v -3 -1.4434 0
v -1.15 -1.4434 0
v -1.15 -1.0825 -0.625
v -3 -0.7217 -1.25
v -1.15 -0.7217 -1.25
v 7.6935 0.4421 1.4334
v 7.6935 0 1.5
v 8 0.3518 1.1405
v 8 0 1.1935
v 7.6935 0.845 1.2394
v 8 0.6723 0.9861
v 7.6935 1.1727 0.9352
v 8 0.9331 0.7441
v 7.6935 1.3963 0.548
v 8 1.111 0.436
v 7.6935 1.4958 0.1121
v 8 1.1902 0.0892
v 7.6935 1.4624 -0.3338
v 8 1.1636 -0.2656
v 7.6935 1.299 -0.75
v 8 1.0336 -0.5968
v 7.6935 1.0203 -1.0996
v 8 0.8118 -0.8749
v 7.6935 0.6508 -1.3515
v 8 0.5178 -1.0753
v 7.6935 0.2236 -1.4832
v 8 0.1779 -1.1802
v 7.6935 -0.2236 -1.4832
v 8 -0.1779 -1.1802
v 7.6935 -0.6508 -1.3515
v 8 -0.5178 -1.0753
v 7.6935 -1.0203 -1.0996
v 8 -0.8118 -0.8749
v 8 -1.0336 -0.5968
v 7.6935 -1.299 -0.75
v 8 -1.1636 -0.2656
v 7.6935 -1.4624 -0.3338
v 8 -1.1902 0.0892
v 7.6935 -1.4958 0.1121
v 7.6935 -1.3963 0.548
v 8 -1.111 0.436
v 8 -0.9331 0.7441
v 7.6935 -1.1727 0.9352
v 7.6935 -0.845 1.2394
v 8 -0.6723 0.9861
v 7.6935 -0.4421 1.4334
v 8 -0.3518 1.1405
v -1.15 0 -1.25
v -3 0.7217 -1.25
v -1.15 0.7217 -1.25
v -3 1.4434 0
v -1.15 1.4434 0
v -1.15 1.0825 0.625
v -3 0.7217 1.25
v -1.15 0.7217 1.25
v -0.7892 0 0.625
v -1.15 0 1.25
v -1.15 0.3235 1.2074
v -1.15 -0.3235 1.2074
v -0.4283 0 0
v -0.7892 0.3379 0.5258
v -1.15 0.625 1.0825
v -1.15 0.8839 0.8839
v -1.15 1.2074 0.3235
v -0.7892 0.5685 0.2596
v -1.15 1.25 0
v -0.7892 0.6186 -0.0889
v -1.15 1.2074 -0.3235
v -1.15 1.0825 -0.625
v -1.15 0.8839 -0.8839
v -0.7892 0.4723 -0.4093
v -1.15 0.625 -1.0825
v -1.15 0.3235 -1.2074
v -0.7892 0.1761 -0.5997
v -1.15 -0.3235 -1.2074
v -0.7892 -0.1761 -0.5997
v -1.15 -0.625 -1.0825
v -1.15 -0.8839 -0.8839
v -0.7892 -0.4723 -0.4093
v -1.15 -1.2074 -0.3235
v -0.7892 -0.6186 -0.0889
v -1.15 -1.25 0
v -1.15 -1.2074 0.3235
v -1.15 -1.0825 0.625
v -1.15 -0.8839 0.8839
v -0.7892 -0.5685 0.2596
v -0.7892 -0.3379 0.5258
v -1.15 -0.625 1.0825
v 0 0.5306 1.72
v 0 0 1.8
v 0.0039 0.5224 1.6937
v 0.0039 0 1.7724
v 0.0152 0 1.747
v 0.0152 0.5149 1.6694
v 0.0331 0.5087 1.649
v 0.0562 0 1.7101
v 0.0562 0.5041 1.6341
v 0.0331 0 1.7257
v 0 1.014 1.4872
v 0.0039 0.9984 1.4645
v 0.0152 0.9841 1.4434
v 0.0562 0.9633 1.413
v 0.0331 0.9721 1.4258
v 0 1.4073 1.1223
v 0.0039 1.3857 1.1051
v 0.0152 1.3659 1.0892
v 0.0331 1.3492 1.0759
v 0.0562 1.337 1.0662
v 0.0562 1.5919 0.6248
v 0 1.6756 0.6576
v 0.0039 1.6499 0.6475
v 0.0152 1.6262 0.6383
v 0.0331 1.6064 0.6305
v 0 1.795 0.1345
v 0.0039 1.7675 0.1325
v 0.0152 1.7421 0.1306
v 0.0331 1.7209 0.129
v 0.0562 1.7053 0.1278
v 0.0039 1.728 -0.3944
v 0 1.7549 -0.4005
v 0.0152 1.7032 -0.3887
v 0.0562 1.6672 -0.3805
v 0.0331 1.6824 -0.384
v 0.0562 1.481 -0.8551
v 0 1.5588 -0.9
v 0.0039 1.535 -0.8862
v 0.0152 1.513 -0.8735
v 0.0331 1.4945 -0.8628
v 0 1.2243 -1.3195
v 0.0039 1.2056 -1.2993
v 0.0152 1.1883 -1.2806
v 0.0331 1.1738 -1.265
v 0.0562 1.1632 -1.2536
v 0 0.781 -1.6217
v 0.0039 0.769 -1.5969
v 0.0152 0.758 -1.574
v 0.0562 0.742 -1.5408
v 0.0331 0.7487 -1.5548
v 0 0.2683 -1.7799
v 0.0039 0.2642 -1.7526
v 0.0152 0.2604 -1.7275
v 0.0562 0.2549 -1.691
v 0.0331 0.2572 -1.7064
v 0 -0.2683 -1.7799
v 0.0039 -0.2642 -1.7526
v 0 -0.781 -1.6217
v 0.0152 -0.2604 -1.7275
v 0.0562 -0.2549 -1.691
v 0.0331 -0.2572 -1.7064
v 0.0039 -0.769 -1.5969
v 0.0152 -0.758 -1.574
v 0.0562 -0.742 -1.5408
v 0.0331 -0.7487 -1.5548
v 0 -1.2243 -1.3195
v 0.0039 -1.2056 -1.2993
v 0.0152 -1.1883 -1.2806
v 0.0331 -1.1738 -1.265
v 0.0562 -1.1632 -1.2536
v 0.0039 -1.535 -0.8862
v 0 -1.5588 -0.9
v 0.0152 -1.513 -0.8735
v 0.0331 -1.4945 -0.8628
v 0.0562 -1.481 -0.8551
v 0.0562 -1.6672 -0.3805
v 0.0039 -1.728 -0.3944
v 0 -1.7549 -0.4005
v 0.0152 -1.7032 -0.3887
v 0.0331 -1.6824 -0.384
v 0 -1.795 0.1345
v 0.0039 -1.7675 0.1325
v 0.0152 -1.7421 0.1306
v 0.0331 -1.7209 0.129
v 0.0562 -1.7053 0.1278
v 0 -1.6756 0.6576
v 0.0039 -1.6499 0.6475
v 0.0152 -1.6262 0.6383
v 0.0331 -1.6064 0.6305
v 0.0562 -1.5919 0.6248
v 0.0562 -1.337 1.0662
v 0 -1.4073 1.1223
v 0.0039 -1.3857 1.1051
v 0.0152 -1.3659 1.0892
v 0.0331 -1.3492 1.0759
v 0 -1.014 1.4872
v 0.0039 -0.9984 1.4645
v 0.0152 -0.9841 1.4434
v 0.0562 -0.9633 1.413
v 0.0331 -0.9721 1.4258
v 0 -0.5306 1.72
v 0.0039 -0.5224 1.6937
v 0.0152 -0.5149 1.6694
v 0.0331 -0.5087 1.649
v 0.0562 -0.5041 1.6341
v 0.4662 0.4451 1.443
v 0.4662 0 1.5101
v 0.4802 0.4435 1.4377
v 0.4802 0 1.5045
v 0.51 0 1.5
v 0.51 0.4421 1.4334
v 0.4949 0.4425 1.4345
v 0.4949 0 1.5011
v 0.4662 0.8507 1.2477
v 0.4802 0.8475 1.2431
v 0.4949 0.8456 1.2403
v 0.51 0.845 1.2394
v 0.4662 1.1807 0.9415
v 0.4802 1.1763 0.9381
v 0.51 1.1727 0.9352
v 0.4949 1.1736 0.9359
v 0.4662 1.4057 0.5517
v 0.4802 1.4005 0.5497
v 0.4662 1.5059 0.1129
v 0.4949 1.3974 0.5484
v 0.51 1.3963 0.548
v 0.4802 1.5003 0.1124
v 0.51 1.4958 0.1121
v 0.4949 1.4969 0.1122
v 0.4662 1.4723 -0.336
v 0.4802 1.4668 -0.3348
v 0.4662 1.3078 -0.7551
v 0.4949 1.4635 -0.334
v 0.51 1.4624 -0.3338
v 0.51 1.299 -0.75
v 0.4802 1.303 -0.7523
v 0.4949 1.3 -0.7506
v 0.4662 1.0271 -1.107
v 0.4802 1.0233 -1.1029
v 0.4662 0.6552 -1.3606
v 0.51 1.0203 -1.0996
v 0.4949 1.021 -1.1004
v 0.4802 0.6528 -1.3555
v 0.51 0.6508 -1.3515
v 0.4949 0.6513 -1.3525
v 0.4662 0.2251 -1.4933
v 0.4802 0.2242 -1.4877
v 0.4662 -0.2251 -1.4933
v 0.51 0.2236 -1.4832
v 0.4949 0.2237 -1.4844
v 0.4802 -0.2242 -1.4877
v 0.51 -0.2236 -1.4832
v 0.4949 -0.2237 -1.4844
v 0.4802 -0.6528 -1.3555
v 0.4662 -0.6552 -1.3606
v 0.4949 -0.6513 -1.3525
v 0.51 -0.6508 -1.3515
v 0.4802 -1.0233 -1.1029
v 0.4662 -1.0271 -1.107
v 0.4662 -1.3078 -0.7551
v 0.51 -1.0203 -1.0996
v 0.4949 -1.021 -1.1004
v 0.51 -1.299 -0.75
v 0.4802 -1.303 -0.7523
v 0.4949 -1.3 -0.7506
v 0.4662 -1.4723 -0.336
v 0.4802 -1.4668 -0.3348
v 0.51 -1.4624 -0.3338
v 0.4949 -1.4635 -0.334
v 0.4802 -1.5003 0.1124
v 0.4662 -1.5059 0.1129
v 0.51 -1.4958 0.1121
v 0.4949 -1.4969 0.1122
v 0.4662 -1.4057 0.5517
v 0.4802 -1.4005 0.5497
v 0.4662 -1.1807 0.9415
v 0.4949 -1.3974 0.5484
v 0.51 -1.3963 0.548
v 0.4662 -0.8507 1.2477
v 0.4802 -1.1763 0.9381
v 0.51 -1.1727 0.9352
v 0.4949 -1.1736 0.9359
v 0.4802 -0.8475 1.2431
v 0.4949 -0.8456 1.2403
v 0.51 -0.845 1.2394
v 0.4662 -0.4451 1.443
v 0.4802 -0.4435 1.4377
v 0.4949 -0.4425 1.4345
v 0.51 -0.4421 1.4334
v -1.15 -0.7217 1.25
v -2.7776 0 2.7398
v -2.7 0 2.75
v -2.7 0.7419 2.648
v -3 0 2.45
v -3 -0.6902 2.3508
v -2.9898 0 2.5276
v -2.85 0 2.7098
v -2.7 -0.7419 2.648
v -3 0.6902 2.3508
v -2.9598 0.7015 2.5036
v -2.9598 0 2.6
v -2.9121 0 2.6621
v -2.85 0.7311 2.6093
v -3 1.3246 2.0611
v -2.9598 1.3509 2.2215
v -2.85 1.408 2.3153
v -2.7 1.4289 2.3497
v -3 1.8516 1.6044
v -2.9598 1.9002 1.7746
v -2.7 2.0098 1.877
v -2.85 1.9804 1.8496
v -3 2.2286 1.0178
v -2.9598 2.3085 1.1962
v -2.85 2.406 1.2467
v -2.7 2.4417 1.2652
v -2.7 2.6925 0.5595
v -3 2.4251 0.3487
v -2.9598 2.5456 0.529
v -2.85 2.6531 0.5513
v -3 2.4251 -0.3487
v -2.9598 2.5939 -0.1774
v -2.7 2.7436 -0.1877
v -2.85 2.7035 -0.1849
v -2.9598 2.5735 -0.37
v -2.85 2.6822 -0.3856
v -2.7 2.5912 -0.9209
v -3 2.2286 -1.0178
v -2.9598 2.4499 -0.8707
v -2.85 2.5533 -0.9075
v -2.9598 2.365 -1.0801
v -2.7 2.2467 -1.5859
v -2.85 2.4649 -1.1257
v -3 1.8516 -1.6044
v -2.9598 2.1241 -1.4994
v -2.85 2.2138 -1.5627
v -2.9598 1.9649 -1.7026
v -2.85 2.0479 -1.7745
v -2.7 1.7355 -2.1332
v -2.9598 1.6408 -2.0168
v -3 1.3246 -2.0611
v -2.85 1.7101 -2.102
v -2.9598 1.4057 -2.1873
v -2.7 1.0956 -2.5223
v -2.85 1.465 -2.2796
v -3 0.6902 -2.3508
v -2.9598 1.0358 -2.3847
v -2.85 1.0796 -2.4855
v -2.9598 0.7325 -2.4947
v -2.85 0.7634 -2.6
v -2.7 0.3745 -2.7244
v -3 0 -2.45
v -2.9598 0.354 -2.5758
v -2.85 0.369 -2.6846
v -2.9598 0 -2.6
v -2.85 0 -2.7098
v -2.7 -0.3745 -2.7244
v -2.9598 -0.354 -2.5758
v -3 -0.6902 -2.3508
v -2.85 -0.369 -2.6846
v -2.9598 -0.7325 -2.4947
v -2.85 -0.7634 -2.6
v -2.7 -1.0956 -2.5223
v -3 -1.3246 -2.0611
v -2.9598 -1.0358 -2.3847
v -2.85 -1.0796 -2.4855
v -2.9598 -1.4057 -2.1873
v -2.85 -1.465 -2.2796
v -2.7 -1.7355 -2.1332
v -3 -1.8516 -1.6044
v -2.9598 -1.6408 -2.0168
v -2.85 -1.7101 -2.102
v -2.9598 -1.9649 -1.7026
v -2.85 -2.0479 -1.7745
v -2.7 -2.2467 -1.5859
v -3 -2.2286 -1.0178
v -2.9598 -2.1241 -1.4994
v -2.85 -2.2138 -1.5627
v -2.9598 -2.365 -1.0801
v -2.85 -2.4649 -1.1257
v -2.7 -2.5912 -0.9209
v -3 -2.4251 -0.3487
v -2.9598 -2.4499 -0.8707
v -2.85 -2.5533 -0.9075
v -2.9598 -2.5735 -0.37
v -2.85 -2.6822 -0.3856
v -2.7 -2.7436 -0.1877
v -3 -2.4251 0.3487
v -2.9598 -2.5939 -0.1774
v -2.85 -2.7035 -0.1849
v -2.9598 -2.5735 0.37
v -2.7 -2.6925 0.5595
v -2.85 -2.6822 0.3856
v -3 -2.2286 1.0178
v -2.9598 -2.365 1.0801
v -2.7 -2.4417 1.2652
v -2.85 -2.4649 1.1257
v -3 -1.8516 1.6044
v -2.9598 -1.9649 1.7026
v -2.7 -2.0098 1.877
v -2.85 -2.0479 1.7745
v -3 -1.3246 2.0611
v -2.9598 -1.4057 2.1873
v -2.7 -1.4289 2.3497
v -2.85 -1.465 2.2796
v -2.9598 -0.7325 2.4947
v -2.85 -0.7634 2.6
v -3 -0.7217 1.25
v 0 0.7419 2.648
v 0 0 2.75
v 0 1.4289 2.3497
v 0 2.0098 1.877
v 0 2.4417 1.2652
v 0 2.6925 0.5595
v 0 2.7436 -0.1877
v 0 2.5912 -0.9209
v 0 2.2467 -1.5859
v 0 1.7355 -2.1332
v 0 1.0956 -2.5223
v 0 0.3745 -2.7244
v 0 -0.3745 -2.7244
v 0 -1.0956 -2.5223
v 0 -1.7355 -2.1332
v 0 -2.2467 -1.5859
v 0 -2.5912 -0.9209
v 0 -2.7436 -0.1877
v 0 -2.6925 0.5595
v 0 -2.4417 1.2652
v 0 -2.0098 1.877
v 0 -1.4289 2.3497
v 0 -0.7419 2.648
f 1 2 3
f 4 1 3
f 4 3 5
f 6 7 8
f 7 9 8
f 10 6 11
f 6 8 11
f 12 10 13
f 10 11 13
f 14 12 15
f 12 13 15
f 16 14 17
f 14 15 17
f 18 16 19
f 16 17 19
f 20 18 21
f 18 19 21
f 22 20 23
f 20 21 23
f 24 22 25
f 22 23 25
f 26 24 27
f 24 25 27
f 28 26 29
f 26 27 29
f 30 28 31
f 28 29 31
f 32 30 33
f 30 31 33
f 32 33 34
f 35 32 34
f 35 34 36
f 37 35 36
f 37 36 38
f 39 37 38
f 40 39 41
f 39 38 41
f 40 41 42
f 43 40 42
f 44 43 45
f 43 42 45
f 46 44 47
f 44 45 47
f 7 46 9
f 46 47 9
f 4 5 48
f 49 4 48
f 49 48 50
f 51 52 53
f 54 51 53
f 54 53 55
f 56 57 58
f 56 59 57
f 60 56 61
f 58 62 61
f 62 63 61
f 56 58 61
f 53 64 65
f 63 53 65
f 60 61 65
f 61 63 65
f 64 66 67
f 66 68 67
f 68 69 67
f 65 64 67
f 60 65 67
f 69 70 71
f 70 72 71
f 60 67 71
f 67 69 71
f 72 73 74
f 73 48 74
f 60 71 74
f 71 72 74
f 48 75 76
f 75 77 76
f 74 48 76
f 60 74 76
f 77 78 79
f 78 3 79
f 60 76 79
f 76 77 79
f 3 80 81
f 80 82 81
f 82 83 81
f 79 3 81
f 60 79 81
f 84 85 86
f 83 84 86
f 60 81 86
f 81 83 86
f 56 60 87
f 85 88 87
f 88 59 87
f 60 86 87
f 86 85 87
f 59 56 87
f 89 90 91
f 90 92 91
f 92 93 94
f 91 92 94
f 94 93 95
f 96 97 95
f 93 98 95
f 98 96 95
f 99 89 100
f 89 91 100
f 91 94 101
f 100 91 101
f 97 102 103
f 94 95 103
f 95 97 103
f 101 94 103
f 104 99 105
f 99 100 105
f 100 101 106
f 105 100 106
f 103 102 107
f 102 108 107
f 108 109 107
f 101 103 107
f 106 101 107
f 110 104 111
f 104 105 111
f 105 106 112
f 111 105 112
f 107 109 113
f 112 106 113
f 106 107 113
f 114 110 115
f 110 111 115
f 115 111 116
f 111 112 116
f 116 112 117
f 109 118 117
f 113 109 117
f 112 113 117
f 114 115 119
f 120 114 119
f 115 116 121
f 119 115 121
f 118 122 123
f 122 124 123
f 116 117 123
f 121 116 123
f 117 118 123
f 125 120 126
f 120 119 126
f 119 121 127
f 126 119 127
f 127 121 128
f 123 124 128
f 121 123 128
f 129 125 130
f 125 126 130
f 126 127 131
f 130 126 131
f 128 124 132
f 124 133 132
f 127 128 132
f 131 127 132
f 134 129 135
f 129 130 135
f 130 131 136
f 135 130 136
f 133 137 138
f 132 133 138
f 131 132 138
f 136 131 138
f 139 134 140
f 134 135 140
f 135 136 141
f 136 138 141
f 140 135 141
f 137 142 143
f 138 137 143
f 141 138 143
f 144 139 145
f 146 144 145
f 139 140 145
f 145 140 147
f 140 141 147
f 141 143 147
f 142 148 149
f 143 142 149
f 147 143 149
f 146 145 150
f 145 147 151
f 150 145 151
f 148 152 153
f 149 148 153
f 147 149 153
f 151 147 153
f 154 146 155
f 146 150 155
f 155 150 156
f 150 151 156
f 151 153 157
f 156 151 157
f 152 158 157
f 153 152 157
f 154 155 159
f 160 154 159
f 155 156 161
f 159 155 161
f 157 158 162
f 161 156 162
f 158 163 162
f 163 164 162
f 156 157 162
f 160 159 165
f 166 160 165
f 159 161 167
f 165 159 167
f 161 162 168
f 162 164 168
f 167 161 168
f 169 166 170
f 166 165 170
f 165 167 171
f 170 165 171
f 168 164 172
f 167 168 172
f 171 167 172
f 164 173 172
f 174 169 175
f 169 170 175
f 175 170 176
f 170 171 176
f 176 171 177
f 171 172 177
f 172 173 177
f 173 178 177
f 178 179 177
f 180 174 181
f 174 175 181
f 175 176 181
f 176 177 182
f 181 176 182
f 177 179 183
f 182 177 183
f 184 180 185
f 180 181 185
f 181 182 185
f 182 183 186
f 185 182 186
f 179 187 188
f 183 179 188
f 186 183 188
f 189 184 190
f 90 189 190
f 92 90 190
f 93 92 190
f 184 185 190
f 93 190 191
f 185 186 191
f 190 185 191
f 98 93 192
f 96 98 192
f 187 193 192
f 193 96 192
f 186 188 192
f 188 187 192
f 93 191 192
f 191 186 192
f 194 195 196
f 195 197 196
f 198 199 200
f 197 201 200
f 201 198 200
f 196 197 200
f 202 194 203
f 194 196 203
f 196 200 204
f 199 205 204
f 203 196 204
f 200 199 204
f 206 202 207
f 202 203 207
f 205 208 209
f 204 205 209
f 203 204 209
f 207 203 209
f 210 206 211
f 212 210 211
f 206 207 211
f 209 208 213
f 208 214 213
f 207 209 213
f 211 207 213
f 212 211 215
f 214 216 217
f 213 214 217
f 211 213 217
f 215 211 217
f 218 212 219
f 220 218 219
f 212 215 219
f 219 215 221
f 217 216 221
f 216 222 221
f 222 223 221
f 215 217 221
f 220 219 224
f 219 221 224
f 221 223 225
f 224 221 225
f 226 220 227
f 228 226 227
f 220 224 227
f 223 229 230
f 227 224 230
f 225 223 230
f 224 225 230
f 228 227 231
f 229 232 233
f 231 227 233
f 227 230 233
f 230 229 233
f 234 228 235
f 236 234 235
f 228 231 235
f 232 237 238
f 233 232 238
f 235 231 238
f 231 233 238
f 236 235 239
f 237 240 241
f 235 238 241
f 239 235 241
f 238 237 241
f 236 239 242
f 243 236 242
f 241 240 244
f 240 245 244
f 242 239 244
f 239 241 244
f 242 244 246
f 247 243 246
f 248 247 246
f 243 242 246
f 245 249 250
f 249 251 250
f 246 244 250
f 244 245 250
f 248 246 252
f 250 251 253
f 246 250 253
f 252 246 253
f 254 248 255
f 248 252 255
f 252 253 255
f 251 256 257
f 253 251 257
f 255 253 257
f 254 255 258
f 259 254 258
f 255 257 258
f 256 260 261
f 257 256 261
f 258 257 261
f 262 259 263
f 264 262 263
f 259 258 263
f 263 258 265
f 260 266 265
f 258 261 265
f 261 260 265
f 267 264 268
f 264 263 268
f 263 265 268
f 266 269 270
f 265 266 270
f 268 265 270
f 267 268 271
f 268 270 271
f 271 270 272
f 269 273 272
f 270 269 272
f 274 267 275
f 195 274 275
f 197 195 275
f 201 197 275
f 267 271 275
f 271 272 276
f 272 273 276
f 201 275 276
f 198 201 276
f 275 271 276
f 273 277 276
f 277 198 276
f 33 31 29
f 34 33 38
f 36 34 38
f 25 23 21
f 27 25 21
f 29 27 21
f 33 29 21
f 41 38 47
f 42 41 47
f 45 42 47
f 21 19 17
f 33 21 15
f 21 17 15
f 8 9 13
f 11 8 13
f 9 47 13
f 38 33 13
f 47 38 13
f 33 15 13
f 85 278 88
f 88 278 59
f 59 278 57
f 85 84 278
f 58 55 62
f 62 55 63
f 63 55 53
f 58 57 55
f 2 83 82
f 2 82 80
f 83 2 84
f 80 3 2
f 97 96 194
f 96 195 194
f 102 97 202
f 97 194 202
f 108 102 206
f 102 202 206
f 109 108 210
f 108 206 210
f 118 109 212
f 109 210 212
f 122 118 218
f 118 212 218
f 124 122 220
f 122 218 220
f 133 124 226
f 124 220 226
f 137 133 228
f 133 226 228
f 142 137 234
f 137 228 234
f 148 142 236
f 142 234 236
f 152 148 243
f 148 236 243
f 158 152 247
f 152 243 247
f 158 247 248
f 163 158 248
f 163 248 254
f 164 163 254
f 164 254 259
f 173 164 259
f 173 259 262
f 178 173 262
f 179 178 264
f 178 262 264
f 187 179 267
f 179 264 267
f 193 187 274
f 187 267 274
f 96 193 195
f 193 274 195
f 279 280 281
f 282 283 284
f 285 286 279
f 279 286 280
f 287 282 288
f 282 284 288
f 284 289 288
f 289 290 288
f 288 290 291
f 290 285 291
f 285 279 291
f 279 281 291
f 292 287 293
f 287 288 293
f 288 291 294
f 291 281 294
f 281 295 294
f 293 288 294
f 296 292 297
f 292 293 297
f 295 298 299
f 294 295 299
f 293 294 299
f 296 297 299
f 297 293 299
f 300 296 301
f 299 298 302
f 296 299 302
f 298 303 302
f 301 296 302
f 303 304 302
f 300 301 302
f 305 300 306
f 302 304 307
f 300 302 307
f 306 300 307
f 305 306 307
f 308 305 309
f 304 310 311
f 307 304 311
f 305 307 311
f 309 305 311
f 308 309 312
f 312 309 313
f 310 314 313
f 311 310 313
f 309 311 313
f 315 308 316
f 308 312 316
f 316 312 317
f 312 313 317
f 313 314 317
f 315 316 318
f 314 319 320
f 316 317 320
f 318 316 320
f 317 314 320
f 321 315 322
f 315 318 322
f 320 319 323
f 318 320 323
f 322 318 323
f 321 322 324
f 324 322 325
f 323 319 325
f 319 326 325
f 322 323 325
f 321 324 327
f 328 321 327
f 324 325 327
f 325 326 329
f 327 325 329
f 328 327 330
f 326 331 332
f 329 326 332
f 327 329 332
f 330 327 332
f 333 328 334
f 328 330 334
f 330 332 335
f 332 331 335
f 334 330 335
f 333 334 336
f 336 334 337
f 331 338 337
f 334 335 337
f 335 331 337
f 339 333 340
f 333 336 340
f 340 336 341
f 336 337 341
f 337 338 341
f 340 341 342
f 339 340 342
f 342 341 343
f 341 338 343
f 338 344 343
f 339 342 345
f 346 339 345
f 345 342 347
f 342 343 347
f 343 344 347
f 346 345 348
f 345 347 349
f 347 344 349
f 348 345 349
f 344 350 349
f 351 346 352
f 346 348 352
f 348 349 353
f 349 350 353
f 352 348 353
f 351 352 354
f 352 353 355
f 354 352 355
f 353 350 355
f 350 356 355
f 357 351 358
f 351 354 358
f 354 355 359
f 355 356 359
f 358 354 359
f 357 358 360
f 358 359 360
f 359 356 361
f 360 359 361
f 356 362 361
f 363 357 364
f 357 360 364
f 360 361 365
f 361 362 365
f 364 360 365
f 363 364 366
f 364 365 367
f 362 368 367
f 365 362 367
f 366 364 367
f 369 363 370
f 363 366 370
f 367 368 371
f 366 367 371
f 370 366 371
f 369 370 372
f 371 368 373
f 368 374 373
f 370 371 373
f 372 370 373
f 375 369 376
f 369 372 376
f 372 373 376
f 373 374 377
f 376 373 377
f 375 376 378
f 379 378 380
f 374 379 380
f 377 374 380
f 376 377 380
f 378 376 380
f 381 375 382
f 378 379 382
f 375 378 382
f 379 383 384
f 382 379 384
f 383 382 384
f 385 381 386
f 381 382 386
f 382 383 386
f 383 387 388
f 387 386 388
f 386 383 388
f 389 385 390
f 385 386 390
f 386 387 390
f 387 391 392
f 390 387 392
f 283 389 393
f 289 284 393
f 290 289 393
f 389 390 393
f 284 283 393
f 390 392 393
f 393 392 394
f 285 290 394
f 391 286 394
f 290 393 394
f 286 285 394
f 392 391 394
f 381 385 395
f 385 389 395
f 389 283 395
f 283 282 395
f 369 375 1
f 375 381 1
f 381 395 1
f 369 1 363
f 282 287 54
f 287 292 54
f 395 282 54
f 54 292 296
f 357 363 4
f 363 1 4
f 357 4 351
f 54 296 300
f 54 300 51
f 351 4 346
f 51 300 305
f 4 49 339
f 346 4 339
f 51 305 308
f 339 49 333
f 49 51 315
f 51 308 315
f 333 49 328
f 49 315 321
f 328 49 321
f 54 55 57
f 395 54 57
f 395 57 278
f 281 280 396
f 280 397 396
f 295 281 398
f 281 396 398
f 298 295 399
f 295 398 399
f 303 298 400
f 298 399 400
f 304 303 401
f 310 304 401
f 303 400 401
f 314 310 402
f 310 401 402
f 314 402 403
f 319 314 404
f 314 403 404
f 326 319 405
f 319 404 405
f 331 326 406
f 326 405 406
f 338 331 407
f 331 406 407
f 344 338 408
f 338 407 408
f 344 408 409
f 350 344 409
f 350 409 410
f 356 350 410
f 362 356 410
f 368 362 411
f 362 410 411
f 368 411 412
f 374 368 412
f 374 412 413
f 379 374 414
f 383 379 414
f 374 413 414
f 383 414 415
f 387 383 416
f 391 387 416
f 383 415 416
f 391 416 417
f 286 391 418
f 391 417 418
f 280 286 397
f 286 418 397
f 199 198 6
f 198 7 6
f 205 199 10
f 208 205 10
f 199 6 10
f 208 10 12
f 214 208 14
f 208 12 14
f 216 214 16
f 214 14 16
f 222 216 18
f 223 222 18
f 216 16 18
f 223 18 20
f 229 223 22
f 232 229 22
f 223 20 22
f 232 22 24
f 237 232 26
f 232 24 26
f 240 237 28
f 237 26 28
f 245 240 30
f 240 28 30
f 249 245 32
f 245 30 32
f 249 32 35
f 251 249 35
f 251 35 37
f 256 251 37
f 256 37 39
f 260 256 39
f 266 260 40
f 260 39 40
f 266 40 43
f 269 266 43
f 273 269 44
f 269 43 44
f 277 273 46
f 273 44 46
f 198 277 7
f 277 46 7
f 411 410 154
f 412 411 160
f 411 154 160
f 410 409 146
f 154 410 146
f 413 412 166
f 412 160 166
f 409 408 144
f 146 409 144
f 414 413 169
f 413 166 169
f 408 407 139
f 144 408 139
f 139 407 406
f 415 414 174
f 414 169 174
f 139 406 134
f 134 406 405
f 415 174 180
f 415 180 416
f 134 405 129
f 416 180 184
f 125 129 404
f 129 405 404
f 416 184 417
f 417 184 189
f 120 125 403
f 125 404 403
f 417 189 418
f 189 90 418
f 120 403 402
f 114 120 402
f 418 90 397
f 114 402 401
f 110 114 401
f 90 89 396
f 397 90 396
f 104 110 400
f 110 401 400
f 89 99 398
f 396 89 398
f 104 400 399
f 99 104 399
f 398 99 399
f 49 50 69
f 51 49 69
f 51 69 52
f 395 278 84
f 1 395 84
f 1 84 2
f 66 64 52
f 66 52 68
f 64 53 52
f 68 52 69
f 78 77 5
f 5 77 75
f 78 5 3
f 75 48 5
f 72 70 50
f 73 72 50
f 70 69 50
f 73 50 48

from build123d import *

# Parameters (mm, degrees)
CUT_EXTRUDE1_DEPTH = 2.6


with BuildPart() as part:
    # Sketch1 → Revolve1 (revolve)
    with BuildSketch(Plane.XY, mode=Mode.PRIVATE) as revolve1_sk:
        with BuildLine():
            Line((-0.428312164, 0), (-1.15, 1.25))
            Line((-1.15, 1.25), (-3, 1.25))
            Line((-3, 1.25), (-3, 2.45))
            ThreePointArc((-3, 2.45), (-2.912132034, 2.662132034), (-2.7, 2.75))
            Line((-2.7, 2.75), (0, 2.75))
            Line((0, 2.75), (0, 1.8))
            ThreePointArc((0, 1.8), (0.015193643, 1.74701055), (0.056157637, 1.710123155))
            Line((0.056157637, 1.710123155), (0.466157637, 1.510123155))
            ThreePointArc((0.466157637, 1.510123155), (0.48750205, 1.50256365), (0.51, 1.5))
            Line((0.51, 1.5), (7.6935, 1.5))
            Line((7.6935, 1.5), (8, 1.1935))
            Line((8, 1.1935), (8, 0))
            Line((8, 0), (-0.428312164, 0))
        make_face()
    revolve(revolve1_sk.sketch.rotate(Axis((8, 0, 0), (-1, 0, 0)), 270), axis=Axis((8, 0, 0), (-1, 0, 0)))

    # Sketch2 → Cut-Extrude1 (cut)
    with BuildSketch(Plane(origin=(-1.15, 0, 0), x_dir=(0, 0, -1), z_dir=(1, 0, 0))):
        Polygon((-1.25, 0.721687836), (-1.25, -0.721687836), (0, -1.443375673), (1.25, -0.721687836), (1.25, 0.721687836), (0, 1.443375673), align=None)
    extrude(amount=-CUT_EXTRUDE1_DEPTH, mode=Mode.SUBTRACT)


solid = part.part
